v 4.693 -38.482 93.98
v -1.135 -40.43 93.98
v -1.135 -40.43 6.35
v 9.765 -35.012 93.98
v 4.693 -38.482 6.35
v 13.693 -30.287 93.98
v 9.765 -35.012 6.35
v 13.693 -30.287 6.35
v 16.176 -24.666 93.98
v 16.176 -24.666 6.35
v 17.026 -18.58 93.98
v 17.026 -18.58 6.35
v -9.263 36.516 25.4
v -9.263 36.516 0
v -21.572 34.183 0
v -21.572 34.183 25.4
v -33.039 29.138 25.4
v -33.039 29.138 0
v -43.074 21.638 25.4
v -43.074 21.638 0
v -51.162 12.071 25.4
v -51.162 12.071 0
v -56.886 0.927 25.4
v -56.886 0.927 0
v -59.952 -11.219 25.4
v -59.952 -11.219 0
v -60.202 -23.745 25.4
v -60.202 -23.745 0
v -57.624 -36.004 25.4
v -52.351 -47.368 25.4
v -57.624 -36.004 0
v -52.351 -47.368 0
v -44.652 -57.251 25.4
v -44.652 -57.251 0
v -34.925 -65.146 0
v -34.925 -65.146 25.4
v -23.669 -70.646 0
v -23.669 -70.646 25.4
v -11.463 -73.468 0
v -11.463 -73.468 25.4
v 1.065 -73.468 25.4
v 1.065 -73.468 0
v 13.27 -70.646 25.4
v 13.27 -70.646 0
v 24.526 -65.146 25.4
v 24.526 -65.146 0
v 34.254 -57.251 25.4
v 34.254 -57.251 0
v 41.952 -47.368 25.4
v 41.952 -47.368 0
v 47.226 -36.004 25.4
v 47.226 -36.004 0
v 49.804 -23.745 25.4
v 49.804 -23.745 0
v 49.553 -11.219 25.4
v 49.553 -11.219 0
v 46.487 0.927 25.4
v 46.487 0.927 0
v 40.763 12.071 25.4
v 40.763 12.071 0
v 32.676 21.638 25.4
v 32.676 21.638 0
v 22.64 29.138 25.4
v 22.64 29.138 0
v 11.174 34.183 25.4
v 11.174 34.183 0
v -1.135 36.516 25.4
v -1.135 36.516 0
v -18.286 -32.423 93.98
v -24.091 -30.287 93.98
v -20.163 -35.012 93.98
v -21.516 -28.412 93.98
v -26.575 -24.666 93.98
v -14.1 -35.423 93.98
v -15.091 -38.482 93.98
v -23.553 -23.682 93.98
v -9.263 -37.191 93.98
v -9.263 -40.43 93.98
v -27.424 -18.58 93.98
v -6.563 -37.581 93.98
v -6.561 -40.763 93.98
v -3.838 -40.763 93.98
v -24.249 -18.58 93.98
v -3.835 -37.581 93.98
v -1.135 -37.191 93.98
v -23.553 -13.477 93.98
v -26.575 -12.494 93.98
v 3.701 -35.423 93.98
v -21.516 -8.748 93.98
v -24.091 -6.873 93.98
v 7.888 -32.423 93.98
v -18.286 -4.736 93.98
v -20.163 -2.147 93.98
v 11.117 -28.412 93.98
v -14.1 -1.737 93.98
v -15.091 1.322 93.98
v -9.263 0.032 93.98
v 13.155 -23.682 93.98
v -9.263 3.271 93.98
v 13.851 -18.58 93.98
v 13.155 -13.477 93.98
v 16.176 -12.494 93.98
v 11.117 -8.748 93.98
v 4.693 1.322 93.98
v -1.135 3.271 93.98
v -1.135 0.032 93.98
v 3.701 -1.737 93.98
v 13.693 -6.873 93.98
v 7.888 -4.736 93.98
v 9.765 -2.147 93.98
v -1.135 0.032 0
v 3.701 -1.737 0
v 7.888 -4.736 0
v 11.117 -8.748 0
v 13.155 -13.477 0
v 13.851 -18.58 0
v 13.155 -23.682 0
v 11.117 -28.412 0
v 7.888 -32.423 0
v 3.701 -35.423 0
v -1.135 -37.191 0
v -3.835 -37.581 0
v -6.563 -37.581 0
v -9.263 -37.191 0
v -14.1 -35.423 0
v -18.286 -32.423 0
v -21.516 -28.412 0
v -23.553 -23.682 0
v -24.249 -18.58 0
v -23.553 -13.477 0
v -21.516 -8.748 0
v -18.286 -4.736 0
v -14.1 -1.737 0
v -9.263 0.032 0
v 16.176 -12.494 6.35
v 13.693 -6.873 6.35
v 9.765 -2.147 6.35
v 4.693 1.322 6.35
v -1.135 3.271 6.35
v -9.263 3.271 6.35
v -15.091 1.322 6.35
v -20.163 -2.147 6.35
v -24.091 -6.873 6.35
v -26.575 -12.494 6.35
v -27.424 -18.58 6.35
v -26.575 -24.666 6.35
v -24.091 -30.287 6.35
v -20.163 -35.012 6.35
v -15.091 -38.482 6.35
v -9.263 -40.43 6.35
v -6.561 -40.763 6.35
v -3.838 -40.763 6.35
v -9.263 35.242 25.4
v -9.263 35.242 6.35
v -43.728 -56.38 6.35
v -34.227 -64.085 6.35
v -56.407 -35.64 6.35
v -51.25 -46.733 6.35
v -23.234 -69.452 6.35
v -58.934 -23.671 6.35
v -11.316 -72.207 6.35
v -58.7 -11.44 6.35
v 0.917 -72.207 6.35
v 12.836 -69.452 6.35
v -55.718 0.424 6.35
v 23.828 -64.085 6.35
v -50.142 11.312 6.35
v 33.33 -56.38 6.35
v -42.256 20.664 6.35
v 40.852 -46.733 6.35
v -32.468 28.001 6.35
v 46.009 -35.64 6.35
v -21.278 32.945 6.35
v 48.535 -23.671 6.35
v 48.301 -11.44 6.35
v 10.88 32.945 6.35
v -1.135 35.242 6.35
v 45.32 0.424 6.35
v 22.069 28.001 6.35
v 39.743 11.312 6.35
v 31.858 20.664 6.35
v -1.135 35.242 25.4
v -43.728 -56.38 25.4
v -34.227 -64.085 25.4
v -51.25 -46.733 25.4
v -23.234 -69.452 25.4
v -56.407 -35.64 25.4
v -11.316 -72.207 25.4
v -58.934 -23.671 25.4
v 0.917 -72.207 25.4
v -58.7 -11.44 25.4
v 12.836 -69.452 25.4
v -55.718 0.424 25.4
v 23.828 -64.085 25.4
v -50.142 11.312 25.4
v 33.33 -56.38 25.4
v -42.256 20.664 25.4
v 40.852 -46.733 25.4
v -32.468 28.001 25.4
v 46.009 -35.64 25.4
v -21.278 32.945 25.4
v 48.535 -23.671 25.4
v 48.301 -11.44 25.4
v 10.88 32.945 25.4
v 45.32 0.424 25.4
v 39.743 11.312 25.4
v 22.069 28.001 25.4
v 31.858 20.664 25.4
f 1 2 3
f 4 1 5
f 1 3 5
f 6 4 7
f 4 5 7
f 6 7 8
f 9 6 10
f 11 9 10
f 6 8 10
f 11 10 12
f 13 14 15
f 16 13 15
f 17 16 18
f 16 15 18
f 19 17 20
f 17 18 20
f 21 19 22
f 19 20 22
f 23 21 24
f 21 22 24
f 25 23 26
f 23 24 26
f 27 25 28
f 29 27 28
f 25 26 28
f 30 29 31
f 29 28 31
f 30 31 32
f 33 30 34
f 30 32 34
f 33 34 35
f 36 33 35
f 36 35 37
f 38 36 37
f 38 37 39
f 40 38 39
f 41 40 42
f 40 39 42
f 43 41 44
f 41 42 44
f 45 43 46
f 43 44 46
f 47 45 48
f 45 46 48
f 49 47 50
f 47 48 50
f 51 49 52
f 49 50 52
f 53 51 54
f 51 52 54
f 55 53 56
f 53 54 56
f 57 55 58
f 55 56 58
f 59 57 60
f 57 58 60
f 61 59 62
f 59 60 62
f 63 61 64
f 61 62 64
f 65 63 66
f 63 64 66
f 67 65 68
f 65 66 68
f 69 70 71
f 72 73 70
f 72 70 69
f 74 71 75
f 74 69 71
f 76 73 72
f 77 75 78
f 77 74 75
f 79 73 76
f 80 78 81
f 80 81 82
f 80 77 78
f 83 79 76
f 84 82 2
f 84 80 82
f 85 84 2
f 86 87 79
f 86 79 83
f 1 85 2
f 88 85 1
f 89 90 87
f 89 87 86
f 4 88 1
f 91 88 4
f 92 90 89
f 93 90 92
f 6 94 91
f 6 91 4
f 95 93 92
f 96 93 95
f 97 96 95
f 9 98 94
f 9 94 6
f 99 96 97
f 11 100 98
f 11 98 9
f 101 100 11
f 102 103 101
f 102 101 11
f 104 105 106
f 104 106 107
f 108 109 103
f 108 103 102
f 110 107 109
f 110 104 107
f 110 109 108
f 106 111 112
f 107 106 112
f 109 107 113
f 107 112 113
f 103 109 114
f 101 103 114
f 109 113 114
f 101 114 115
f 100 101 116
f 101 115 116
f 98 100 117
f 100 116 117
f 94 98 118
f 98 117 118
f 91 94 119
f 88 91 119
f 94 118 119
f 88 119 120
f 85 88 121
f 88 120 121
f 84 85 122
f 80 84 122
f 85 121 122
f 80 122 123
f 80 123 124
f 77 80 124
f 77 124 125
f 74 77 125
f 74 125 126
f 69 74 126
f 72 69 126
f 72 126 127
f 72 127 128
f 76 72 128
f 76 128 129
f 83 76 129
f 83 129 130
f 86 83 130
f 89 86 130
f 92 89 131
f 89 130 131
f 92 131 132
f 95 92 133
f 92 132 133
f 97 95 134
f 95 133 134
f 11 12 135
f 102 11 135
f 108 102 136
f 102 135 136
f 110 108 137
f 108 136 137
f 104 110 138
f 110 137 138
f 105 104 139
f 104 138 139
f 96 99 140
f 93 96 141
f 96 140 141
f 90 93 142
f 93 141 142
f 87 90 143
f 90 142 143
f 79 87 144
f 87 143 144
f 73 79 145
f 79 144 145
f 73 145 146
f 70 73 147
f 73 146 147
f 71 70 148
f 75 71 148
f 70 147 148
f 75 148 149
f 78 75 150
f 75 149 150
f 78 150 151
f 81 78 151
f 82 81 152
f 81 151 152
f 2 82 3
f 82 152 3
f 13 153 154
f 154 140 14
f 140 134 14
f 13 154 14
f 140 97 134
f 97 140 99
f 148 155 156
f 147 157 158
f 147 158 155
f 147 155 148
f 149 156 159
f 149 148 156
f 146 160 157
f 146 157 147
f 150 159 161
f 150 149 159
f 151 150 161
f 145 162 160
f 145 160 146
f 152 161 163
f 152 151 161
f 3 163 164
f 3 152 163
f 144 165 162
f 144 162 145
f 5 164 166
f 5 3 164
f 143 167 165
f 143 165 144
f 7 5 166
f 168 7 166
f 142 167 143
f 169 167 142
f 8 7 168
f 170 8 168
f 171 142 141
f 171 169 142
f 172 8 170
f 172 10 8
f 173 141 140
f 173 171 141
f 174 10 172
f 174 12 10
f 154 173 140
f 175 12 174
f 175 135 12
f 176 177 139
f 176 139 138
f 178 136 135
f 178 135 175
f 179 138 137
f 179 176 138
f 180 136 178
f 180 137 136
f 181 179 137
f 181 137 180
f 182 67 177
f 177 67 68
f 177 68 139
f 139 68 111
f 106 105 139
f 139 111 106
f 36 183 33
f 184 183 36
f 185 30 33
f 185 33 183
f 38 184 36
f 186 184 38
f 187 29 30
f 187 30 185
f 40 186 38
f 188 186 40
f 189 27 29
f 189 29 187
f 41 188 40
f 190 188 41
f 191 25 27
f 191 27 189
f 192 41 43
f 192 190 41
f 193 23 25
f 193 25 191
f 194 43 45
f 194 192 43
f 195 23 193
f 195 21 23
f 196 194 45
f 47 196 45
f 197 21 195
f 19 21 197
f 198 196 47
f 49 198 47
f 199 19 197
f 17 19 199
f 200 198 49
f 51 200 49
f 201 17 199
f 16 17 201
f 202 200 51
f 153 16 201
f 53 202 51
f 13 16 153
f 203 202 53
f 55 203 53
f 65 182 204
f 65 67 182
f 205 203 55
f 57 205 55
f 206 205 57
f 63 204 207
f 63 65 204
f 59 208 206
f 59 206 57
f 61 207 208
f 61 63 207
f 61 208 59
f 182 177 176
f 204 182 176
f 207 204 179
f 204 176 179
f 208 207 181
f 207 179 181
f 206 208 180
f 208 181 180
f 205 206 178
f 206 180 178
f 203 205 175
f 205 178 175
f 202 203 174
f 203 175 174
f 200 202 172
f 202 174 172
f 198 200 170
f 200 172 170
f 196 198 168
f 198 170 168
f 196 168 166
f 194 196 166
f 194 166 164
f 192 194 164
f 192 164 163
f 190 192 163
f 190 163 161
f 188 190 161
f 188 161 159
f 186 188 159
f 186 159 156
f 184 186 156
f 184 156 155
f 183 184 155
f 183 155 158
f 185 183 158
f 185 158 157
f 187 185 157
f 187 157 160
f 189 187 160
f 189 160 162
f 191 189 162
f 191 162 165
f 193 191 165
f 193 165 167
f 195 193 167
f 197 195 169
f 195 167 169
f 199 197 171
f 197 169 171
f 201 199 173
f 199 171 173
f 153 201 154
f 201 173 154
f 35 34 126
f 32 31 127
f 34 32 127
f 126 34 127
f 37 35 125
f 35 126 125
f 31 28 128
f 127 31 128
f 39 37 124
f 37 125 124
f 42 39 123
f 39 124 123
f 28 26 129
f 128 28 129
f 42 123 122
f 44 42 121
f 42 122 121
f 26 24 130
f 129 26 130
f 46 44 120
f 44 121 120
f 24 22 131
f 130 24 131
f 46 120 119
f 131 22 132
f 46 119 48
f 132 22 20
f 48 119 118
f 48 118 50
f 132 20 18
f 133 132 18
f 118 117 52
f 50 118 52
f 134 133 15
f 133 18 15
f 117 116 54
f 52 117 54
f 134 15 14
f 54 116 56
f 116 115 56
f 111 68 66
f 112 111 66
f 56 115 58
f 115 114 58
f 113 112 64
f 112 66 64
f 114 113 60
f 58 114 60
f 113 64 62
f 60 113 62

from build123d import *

# Parameters (mm, degrees)
F1_DEPTH = 25.4
F2_DEPTH = 6.35
F3_DEPTH = 93.98


with BuildPart() as f1:
    # F0 (on Top) → F1 (new body)
    with BuildSketch(Plane.XY):
        with BuildLine():
            ThreePointArc((-1.1352293447, 35.2420264333), (34.3776264235, 18.1213738464), (48.7757706553, -18.579758459))
            ThreePointArc((48.7757706553, -18.579758459), (-41.9003616501, -58.1566142273), (-9.2632293447, 35.2420264333))
            Line((-9.2632293447, 35.2420264333), (-9.2632293447, 36.515558302))
            ThreePointArc((-9.2632293447, 36.515558302), (-42.7990587659, -59.0552183391), (50.0457706553, -18.579758459))
            ThreePointArc((50.0457706553, -18.579758459), (35.2762305353, 19.0200709621), (-1.1352293447, 36.515558302))
            Line((-1.1352293447, 36.515558302), (-1.1352293447, 35.2420264333))
        make_face()
    extrude(amount=F1_DEPTH)

    # F0 (on Top) → F2 (join)
    with BuildSketch(Plane.XY):
        with BuildLine():
            ThreePointArc((-9.2632293447, 35.2420264333), (-41.9003616501, -58.1566142273), (48.7757706553, -18.579758459))
            ThreePointArc((48.7757706553, -18.579758459), (34.3776264235, 18.1213738464), (-1.1352293447, 35.2420264333))
            Line((-1.1352293447, 35.2420264333), (-1.1352293447, 3.2705168024))
            ThreePointArc((-1.1352293447, 3.2705168024), (11.8927720741, -4.3736290601), (17.0257706553, -18.579758459))
            ThreePointArc((17.0257706553, -18.579758459), (11.8927720741, -32.785887858), (-1.1352293447, -40.4300337205))
            Line((-1.1352293447, -40.4300337205), (-1.1352293447, -67.4839898818))
            Line((-1.1352293447, -67.4839898818), (-9.2632293447, -67.4839898818))
            Line((-9.2632293447, -67.4839898818), (-9.2632293447, -40.4300337205))
            ThreePointArc((-9.2632293447, -40.4300337205), (-27.4242293447, -18.579758459), (-9.2632293447, 3.2705168024))
            Line((-9.2632293447, 3.2705168024), (-9.2632293447, 35.2420264333))
        make_face()
        with BuildLine():
            ThreePointArc((17.0257706553, -18.579758459), (11.8927720741, -4.3736290601), (-1.1352293447, 3.2705168024))
            Line((-1.1352293447, 3.2705168024), (-1.1352293447, 0.0317004843))
            ThreePointArc((-1.1352293447, 0.0317004843), (9.6385888911, -6.6323047554), (13.8507706553, -18.579758459))
            ThreePointArc((13.8507706553, -18.579758459), (9.6385888911, -30.5272121626), (-1.1352293447, -37.1912174024))
            Line((-1.1352293447, -37.1912174024), (-1.1352293447, -40.4300337205))
            ThreePointArc((-1.1352293447, -40.4300337205), (11.8927720741, -32.785887858), (17.0257706553, -18.579758459))
        make_face()
        with BuildLine():
            Line((-9.2632293447, -37.1912174024), (-9.2632293447, -40.4300337205))
            ThreePointArc((-9.2632293447, -40.4300337205), (-5.1992293447, -40.804758459), (-1.1352293447, -40.4300337205))
            Line((-1.1352293447, -40.4300337205), (-1.1352293447, -37.1912174024))
            ThreePointArc((-1.1352293447, -37.1912174024), (-5.1992293447, -37.629758459), (-9.2632293447, -37.1912174024))
        make_face()
        with BuildLine():
            Line((-9.2632293447, 0.0317004843), (-9.2632293447, 3.2705168024))
            ThreePointArc((-9.2632293447, 3.2705168024), (-27.4242293447, -18.579758459), (-9.2632293447, -40.4300337205))
            Line((-9.2632293447, -40.4300337205), (-9.2632293447, -37.1912174024))
            ThreePointArc((-9.2632293447, -37.1912174024), (-24.2492293447, -18.579758459), (-9.2632293447, 0.0317004843))
        make_face()
        with BuildLine():
            ThreePointArc((-1.1352293447, -40.4300337205), (-5.1992293447, -40.804758459), (-9.2632293447, -40.4300337205))
            Line((-9.2632293447, -40.4300337205), (-9.2632293447, -67.4839898818))
            Line((-9.2632293447, -67.4839898818), (-1.1352293447, -67.4839898818))
            Line((-1.1352293447, -67.4839898818), (-1.1352293447, -40.4300337205))
        make_face()
    extrude(amount=F2_DEPTH)

    # F0 (on Top) → F3 (join)
    with BuildSketch(Plane.XY):
        with BuildLine():
            ThreePointArc((17.0257706553, -18.579758459), (11.8927720741, -4.3736290601), (-1.1352293447, 3.2705168024))
            Line((-1.1352293447, 3.2705168024), (-1.1352293447, 0.0317004843))
            ThreePointArc((-1.1352293447, 0.0317004843), (9.6385888911, -6.6323047554), (13.8507706553, -18.579758459))
            ThreePointArc((13.8507706553, -18.579758459), (9.6385888911, -30.5272121626), (-1.1352293447, -37.1912174024))
            Line((-1.1352293447, -37.1912174024), (-1.1352293447, -40.4300337205))
            ThreePointArc((-1.1352293447, -40.4300337205), (11.8927720741, -32.785887858), (17.0257706553, -18.579758459))
        make_face()
        with BuildLine():
            Line((-9.2632293447, -37.1912174024), (-9.2632293447, -40.4300337205))
            ThreePointArc((-9.2632293447, -40.4300337205), (-5.1992293447, -40.804758459), (-1.1352293447, -40.4300337205))
            Line((-1.1352293447, -40.4300337205), (-1.1352293447, -37.1912174024))
            ThreePointArc((-1.1352293447, -37.1912174024), (-5.1992293447, -37.629758459), (-9.2632293447, -37.1912174024))
        make_face()
        with BuildLine():
            Line((-9.2632293447, 0.0317004843), (-9.2632293447, 3.2705168024))
            ThreePointArc((-9.2632293447, 3.2705168024), (-27.4242293447, -18.579758459), (-9.2632293447, -40.4300337205))
            Line((-9.2632293447, -40.4300337205), (-9.2632293447, -37.1912174024))
            ThreePointArc((-9.2632293447, -37.1912174024), (-24.2492293447, -18.579758459), (-9.2632293447, 0.0317004843))
        make_face()
    extrude(amount=F3_DEPTH)


solid = f1.part
